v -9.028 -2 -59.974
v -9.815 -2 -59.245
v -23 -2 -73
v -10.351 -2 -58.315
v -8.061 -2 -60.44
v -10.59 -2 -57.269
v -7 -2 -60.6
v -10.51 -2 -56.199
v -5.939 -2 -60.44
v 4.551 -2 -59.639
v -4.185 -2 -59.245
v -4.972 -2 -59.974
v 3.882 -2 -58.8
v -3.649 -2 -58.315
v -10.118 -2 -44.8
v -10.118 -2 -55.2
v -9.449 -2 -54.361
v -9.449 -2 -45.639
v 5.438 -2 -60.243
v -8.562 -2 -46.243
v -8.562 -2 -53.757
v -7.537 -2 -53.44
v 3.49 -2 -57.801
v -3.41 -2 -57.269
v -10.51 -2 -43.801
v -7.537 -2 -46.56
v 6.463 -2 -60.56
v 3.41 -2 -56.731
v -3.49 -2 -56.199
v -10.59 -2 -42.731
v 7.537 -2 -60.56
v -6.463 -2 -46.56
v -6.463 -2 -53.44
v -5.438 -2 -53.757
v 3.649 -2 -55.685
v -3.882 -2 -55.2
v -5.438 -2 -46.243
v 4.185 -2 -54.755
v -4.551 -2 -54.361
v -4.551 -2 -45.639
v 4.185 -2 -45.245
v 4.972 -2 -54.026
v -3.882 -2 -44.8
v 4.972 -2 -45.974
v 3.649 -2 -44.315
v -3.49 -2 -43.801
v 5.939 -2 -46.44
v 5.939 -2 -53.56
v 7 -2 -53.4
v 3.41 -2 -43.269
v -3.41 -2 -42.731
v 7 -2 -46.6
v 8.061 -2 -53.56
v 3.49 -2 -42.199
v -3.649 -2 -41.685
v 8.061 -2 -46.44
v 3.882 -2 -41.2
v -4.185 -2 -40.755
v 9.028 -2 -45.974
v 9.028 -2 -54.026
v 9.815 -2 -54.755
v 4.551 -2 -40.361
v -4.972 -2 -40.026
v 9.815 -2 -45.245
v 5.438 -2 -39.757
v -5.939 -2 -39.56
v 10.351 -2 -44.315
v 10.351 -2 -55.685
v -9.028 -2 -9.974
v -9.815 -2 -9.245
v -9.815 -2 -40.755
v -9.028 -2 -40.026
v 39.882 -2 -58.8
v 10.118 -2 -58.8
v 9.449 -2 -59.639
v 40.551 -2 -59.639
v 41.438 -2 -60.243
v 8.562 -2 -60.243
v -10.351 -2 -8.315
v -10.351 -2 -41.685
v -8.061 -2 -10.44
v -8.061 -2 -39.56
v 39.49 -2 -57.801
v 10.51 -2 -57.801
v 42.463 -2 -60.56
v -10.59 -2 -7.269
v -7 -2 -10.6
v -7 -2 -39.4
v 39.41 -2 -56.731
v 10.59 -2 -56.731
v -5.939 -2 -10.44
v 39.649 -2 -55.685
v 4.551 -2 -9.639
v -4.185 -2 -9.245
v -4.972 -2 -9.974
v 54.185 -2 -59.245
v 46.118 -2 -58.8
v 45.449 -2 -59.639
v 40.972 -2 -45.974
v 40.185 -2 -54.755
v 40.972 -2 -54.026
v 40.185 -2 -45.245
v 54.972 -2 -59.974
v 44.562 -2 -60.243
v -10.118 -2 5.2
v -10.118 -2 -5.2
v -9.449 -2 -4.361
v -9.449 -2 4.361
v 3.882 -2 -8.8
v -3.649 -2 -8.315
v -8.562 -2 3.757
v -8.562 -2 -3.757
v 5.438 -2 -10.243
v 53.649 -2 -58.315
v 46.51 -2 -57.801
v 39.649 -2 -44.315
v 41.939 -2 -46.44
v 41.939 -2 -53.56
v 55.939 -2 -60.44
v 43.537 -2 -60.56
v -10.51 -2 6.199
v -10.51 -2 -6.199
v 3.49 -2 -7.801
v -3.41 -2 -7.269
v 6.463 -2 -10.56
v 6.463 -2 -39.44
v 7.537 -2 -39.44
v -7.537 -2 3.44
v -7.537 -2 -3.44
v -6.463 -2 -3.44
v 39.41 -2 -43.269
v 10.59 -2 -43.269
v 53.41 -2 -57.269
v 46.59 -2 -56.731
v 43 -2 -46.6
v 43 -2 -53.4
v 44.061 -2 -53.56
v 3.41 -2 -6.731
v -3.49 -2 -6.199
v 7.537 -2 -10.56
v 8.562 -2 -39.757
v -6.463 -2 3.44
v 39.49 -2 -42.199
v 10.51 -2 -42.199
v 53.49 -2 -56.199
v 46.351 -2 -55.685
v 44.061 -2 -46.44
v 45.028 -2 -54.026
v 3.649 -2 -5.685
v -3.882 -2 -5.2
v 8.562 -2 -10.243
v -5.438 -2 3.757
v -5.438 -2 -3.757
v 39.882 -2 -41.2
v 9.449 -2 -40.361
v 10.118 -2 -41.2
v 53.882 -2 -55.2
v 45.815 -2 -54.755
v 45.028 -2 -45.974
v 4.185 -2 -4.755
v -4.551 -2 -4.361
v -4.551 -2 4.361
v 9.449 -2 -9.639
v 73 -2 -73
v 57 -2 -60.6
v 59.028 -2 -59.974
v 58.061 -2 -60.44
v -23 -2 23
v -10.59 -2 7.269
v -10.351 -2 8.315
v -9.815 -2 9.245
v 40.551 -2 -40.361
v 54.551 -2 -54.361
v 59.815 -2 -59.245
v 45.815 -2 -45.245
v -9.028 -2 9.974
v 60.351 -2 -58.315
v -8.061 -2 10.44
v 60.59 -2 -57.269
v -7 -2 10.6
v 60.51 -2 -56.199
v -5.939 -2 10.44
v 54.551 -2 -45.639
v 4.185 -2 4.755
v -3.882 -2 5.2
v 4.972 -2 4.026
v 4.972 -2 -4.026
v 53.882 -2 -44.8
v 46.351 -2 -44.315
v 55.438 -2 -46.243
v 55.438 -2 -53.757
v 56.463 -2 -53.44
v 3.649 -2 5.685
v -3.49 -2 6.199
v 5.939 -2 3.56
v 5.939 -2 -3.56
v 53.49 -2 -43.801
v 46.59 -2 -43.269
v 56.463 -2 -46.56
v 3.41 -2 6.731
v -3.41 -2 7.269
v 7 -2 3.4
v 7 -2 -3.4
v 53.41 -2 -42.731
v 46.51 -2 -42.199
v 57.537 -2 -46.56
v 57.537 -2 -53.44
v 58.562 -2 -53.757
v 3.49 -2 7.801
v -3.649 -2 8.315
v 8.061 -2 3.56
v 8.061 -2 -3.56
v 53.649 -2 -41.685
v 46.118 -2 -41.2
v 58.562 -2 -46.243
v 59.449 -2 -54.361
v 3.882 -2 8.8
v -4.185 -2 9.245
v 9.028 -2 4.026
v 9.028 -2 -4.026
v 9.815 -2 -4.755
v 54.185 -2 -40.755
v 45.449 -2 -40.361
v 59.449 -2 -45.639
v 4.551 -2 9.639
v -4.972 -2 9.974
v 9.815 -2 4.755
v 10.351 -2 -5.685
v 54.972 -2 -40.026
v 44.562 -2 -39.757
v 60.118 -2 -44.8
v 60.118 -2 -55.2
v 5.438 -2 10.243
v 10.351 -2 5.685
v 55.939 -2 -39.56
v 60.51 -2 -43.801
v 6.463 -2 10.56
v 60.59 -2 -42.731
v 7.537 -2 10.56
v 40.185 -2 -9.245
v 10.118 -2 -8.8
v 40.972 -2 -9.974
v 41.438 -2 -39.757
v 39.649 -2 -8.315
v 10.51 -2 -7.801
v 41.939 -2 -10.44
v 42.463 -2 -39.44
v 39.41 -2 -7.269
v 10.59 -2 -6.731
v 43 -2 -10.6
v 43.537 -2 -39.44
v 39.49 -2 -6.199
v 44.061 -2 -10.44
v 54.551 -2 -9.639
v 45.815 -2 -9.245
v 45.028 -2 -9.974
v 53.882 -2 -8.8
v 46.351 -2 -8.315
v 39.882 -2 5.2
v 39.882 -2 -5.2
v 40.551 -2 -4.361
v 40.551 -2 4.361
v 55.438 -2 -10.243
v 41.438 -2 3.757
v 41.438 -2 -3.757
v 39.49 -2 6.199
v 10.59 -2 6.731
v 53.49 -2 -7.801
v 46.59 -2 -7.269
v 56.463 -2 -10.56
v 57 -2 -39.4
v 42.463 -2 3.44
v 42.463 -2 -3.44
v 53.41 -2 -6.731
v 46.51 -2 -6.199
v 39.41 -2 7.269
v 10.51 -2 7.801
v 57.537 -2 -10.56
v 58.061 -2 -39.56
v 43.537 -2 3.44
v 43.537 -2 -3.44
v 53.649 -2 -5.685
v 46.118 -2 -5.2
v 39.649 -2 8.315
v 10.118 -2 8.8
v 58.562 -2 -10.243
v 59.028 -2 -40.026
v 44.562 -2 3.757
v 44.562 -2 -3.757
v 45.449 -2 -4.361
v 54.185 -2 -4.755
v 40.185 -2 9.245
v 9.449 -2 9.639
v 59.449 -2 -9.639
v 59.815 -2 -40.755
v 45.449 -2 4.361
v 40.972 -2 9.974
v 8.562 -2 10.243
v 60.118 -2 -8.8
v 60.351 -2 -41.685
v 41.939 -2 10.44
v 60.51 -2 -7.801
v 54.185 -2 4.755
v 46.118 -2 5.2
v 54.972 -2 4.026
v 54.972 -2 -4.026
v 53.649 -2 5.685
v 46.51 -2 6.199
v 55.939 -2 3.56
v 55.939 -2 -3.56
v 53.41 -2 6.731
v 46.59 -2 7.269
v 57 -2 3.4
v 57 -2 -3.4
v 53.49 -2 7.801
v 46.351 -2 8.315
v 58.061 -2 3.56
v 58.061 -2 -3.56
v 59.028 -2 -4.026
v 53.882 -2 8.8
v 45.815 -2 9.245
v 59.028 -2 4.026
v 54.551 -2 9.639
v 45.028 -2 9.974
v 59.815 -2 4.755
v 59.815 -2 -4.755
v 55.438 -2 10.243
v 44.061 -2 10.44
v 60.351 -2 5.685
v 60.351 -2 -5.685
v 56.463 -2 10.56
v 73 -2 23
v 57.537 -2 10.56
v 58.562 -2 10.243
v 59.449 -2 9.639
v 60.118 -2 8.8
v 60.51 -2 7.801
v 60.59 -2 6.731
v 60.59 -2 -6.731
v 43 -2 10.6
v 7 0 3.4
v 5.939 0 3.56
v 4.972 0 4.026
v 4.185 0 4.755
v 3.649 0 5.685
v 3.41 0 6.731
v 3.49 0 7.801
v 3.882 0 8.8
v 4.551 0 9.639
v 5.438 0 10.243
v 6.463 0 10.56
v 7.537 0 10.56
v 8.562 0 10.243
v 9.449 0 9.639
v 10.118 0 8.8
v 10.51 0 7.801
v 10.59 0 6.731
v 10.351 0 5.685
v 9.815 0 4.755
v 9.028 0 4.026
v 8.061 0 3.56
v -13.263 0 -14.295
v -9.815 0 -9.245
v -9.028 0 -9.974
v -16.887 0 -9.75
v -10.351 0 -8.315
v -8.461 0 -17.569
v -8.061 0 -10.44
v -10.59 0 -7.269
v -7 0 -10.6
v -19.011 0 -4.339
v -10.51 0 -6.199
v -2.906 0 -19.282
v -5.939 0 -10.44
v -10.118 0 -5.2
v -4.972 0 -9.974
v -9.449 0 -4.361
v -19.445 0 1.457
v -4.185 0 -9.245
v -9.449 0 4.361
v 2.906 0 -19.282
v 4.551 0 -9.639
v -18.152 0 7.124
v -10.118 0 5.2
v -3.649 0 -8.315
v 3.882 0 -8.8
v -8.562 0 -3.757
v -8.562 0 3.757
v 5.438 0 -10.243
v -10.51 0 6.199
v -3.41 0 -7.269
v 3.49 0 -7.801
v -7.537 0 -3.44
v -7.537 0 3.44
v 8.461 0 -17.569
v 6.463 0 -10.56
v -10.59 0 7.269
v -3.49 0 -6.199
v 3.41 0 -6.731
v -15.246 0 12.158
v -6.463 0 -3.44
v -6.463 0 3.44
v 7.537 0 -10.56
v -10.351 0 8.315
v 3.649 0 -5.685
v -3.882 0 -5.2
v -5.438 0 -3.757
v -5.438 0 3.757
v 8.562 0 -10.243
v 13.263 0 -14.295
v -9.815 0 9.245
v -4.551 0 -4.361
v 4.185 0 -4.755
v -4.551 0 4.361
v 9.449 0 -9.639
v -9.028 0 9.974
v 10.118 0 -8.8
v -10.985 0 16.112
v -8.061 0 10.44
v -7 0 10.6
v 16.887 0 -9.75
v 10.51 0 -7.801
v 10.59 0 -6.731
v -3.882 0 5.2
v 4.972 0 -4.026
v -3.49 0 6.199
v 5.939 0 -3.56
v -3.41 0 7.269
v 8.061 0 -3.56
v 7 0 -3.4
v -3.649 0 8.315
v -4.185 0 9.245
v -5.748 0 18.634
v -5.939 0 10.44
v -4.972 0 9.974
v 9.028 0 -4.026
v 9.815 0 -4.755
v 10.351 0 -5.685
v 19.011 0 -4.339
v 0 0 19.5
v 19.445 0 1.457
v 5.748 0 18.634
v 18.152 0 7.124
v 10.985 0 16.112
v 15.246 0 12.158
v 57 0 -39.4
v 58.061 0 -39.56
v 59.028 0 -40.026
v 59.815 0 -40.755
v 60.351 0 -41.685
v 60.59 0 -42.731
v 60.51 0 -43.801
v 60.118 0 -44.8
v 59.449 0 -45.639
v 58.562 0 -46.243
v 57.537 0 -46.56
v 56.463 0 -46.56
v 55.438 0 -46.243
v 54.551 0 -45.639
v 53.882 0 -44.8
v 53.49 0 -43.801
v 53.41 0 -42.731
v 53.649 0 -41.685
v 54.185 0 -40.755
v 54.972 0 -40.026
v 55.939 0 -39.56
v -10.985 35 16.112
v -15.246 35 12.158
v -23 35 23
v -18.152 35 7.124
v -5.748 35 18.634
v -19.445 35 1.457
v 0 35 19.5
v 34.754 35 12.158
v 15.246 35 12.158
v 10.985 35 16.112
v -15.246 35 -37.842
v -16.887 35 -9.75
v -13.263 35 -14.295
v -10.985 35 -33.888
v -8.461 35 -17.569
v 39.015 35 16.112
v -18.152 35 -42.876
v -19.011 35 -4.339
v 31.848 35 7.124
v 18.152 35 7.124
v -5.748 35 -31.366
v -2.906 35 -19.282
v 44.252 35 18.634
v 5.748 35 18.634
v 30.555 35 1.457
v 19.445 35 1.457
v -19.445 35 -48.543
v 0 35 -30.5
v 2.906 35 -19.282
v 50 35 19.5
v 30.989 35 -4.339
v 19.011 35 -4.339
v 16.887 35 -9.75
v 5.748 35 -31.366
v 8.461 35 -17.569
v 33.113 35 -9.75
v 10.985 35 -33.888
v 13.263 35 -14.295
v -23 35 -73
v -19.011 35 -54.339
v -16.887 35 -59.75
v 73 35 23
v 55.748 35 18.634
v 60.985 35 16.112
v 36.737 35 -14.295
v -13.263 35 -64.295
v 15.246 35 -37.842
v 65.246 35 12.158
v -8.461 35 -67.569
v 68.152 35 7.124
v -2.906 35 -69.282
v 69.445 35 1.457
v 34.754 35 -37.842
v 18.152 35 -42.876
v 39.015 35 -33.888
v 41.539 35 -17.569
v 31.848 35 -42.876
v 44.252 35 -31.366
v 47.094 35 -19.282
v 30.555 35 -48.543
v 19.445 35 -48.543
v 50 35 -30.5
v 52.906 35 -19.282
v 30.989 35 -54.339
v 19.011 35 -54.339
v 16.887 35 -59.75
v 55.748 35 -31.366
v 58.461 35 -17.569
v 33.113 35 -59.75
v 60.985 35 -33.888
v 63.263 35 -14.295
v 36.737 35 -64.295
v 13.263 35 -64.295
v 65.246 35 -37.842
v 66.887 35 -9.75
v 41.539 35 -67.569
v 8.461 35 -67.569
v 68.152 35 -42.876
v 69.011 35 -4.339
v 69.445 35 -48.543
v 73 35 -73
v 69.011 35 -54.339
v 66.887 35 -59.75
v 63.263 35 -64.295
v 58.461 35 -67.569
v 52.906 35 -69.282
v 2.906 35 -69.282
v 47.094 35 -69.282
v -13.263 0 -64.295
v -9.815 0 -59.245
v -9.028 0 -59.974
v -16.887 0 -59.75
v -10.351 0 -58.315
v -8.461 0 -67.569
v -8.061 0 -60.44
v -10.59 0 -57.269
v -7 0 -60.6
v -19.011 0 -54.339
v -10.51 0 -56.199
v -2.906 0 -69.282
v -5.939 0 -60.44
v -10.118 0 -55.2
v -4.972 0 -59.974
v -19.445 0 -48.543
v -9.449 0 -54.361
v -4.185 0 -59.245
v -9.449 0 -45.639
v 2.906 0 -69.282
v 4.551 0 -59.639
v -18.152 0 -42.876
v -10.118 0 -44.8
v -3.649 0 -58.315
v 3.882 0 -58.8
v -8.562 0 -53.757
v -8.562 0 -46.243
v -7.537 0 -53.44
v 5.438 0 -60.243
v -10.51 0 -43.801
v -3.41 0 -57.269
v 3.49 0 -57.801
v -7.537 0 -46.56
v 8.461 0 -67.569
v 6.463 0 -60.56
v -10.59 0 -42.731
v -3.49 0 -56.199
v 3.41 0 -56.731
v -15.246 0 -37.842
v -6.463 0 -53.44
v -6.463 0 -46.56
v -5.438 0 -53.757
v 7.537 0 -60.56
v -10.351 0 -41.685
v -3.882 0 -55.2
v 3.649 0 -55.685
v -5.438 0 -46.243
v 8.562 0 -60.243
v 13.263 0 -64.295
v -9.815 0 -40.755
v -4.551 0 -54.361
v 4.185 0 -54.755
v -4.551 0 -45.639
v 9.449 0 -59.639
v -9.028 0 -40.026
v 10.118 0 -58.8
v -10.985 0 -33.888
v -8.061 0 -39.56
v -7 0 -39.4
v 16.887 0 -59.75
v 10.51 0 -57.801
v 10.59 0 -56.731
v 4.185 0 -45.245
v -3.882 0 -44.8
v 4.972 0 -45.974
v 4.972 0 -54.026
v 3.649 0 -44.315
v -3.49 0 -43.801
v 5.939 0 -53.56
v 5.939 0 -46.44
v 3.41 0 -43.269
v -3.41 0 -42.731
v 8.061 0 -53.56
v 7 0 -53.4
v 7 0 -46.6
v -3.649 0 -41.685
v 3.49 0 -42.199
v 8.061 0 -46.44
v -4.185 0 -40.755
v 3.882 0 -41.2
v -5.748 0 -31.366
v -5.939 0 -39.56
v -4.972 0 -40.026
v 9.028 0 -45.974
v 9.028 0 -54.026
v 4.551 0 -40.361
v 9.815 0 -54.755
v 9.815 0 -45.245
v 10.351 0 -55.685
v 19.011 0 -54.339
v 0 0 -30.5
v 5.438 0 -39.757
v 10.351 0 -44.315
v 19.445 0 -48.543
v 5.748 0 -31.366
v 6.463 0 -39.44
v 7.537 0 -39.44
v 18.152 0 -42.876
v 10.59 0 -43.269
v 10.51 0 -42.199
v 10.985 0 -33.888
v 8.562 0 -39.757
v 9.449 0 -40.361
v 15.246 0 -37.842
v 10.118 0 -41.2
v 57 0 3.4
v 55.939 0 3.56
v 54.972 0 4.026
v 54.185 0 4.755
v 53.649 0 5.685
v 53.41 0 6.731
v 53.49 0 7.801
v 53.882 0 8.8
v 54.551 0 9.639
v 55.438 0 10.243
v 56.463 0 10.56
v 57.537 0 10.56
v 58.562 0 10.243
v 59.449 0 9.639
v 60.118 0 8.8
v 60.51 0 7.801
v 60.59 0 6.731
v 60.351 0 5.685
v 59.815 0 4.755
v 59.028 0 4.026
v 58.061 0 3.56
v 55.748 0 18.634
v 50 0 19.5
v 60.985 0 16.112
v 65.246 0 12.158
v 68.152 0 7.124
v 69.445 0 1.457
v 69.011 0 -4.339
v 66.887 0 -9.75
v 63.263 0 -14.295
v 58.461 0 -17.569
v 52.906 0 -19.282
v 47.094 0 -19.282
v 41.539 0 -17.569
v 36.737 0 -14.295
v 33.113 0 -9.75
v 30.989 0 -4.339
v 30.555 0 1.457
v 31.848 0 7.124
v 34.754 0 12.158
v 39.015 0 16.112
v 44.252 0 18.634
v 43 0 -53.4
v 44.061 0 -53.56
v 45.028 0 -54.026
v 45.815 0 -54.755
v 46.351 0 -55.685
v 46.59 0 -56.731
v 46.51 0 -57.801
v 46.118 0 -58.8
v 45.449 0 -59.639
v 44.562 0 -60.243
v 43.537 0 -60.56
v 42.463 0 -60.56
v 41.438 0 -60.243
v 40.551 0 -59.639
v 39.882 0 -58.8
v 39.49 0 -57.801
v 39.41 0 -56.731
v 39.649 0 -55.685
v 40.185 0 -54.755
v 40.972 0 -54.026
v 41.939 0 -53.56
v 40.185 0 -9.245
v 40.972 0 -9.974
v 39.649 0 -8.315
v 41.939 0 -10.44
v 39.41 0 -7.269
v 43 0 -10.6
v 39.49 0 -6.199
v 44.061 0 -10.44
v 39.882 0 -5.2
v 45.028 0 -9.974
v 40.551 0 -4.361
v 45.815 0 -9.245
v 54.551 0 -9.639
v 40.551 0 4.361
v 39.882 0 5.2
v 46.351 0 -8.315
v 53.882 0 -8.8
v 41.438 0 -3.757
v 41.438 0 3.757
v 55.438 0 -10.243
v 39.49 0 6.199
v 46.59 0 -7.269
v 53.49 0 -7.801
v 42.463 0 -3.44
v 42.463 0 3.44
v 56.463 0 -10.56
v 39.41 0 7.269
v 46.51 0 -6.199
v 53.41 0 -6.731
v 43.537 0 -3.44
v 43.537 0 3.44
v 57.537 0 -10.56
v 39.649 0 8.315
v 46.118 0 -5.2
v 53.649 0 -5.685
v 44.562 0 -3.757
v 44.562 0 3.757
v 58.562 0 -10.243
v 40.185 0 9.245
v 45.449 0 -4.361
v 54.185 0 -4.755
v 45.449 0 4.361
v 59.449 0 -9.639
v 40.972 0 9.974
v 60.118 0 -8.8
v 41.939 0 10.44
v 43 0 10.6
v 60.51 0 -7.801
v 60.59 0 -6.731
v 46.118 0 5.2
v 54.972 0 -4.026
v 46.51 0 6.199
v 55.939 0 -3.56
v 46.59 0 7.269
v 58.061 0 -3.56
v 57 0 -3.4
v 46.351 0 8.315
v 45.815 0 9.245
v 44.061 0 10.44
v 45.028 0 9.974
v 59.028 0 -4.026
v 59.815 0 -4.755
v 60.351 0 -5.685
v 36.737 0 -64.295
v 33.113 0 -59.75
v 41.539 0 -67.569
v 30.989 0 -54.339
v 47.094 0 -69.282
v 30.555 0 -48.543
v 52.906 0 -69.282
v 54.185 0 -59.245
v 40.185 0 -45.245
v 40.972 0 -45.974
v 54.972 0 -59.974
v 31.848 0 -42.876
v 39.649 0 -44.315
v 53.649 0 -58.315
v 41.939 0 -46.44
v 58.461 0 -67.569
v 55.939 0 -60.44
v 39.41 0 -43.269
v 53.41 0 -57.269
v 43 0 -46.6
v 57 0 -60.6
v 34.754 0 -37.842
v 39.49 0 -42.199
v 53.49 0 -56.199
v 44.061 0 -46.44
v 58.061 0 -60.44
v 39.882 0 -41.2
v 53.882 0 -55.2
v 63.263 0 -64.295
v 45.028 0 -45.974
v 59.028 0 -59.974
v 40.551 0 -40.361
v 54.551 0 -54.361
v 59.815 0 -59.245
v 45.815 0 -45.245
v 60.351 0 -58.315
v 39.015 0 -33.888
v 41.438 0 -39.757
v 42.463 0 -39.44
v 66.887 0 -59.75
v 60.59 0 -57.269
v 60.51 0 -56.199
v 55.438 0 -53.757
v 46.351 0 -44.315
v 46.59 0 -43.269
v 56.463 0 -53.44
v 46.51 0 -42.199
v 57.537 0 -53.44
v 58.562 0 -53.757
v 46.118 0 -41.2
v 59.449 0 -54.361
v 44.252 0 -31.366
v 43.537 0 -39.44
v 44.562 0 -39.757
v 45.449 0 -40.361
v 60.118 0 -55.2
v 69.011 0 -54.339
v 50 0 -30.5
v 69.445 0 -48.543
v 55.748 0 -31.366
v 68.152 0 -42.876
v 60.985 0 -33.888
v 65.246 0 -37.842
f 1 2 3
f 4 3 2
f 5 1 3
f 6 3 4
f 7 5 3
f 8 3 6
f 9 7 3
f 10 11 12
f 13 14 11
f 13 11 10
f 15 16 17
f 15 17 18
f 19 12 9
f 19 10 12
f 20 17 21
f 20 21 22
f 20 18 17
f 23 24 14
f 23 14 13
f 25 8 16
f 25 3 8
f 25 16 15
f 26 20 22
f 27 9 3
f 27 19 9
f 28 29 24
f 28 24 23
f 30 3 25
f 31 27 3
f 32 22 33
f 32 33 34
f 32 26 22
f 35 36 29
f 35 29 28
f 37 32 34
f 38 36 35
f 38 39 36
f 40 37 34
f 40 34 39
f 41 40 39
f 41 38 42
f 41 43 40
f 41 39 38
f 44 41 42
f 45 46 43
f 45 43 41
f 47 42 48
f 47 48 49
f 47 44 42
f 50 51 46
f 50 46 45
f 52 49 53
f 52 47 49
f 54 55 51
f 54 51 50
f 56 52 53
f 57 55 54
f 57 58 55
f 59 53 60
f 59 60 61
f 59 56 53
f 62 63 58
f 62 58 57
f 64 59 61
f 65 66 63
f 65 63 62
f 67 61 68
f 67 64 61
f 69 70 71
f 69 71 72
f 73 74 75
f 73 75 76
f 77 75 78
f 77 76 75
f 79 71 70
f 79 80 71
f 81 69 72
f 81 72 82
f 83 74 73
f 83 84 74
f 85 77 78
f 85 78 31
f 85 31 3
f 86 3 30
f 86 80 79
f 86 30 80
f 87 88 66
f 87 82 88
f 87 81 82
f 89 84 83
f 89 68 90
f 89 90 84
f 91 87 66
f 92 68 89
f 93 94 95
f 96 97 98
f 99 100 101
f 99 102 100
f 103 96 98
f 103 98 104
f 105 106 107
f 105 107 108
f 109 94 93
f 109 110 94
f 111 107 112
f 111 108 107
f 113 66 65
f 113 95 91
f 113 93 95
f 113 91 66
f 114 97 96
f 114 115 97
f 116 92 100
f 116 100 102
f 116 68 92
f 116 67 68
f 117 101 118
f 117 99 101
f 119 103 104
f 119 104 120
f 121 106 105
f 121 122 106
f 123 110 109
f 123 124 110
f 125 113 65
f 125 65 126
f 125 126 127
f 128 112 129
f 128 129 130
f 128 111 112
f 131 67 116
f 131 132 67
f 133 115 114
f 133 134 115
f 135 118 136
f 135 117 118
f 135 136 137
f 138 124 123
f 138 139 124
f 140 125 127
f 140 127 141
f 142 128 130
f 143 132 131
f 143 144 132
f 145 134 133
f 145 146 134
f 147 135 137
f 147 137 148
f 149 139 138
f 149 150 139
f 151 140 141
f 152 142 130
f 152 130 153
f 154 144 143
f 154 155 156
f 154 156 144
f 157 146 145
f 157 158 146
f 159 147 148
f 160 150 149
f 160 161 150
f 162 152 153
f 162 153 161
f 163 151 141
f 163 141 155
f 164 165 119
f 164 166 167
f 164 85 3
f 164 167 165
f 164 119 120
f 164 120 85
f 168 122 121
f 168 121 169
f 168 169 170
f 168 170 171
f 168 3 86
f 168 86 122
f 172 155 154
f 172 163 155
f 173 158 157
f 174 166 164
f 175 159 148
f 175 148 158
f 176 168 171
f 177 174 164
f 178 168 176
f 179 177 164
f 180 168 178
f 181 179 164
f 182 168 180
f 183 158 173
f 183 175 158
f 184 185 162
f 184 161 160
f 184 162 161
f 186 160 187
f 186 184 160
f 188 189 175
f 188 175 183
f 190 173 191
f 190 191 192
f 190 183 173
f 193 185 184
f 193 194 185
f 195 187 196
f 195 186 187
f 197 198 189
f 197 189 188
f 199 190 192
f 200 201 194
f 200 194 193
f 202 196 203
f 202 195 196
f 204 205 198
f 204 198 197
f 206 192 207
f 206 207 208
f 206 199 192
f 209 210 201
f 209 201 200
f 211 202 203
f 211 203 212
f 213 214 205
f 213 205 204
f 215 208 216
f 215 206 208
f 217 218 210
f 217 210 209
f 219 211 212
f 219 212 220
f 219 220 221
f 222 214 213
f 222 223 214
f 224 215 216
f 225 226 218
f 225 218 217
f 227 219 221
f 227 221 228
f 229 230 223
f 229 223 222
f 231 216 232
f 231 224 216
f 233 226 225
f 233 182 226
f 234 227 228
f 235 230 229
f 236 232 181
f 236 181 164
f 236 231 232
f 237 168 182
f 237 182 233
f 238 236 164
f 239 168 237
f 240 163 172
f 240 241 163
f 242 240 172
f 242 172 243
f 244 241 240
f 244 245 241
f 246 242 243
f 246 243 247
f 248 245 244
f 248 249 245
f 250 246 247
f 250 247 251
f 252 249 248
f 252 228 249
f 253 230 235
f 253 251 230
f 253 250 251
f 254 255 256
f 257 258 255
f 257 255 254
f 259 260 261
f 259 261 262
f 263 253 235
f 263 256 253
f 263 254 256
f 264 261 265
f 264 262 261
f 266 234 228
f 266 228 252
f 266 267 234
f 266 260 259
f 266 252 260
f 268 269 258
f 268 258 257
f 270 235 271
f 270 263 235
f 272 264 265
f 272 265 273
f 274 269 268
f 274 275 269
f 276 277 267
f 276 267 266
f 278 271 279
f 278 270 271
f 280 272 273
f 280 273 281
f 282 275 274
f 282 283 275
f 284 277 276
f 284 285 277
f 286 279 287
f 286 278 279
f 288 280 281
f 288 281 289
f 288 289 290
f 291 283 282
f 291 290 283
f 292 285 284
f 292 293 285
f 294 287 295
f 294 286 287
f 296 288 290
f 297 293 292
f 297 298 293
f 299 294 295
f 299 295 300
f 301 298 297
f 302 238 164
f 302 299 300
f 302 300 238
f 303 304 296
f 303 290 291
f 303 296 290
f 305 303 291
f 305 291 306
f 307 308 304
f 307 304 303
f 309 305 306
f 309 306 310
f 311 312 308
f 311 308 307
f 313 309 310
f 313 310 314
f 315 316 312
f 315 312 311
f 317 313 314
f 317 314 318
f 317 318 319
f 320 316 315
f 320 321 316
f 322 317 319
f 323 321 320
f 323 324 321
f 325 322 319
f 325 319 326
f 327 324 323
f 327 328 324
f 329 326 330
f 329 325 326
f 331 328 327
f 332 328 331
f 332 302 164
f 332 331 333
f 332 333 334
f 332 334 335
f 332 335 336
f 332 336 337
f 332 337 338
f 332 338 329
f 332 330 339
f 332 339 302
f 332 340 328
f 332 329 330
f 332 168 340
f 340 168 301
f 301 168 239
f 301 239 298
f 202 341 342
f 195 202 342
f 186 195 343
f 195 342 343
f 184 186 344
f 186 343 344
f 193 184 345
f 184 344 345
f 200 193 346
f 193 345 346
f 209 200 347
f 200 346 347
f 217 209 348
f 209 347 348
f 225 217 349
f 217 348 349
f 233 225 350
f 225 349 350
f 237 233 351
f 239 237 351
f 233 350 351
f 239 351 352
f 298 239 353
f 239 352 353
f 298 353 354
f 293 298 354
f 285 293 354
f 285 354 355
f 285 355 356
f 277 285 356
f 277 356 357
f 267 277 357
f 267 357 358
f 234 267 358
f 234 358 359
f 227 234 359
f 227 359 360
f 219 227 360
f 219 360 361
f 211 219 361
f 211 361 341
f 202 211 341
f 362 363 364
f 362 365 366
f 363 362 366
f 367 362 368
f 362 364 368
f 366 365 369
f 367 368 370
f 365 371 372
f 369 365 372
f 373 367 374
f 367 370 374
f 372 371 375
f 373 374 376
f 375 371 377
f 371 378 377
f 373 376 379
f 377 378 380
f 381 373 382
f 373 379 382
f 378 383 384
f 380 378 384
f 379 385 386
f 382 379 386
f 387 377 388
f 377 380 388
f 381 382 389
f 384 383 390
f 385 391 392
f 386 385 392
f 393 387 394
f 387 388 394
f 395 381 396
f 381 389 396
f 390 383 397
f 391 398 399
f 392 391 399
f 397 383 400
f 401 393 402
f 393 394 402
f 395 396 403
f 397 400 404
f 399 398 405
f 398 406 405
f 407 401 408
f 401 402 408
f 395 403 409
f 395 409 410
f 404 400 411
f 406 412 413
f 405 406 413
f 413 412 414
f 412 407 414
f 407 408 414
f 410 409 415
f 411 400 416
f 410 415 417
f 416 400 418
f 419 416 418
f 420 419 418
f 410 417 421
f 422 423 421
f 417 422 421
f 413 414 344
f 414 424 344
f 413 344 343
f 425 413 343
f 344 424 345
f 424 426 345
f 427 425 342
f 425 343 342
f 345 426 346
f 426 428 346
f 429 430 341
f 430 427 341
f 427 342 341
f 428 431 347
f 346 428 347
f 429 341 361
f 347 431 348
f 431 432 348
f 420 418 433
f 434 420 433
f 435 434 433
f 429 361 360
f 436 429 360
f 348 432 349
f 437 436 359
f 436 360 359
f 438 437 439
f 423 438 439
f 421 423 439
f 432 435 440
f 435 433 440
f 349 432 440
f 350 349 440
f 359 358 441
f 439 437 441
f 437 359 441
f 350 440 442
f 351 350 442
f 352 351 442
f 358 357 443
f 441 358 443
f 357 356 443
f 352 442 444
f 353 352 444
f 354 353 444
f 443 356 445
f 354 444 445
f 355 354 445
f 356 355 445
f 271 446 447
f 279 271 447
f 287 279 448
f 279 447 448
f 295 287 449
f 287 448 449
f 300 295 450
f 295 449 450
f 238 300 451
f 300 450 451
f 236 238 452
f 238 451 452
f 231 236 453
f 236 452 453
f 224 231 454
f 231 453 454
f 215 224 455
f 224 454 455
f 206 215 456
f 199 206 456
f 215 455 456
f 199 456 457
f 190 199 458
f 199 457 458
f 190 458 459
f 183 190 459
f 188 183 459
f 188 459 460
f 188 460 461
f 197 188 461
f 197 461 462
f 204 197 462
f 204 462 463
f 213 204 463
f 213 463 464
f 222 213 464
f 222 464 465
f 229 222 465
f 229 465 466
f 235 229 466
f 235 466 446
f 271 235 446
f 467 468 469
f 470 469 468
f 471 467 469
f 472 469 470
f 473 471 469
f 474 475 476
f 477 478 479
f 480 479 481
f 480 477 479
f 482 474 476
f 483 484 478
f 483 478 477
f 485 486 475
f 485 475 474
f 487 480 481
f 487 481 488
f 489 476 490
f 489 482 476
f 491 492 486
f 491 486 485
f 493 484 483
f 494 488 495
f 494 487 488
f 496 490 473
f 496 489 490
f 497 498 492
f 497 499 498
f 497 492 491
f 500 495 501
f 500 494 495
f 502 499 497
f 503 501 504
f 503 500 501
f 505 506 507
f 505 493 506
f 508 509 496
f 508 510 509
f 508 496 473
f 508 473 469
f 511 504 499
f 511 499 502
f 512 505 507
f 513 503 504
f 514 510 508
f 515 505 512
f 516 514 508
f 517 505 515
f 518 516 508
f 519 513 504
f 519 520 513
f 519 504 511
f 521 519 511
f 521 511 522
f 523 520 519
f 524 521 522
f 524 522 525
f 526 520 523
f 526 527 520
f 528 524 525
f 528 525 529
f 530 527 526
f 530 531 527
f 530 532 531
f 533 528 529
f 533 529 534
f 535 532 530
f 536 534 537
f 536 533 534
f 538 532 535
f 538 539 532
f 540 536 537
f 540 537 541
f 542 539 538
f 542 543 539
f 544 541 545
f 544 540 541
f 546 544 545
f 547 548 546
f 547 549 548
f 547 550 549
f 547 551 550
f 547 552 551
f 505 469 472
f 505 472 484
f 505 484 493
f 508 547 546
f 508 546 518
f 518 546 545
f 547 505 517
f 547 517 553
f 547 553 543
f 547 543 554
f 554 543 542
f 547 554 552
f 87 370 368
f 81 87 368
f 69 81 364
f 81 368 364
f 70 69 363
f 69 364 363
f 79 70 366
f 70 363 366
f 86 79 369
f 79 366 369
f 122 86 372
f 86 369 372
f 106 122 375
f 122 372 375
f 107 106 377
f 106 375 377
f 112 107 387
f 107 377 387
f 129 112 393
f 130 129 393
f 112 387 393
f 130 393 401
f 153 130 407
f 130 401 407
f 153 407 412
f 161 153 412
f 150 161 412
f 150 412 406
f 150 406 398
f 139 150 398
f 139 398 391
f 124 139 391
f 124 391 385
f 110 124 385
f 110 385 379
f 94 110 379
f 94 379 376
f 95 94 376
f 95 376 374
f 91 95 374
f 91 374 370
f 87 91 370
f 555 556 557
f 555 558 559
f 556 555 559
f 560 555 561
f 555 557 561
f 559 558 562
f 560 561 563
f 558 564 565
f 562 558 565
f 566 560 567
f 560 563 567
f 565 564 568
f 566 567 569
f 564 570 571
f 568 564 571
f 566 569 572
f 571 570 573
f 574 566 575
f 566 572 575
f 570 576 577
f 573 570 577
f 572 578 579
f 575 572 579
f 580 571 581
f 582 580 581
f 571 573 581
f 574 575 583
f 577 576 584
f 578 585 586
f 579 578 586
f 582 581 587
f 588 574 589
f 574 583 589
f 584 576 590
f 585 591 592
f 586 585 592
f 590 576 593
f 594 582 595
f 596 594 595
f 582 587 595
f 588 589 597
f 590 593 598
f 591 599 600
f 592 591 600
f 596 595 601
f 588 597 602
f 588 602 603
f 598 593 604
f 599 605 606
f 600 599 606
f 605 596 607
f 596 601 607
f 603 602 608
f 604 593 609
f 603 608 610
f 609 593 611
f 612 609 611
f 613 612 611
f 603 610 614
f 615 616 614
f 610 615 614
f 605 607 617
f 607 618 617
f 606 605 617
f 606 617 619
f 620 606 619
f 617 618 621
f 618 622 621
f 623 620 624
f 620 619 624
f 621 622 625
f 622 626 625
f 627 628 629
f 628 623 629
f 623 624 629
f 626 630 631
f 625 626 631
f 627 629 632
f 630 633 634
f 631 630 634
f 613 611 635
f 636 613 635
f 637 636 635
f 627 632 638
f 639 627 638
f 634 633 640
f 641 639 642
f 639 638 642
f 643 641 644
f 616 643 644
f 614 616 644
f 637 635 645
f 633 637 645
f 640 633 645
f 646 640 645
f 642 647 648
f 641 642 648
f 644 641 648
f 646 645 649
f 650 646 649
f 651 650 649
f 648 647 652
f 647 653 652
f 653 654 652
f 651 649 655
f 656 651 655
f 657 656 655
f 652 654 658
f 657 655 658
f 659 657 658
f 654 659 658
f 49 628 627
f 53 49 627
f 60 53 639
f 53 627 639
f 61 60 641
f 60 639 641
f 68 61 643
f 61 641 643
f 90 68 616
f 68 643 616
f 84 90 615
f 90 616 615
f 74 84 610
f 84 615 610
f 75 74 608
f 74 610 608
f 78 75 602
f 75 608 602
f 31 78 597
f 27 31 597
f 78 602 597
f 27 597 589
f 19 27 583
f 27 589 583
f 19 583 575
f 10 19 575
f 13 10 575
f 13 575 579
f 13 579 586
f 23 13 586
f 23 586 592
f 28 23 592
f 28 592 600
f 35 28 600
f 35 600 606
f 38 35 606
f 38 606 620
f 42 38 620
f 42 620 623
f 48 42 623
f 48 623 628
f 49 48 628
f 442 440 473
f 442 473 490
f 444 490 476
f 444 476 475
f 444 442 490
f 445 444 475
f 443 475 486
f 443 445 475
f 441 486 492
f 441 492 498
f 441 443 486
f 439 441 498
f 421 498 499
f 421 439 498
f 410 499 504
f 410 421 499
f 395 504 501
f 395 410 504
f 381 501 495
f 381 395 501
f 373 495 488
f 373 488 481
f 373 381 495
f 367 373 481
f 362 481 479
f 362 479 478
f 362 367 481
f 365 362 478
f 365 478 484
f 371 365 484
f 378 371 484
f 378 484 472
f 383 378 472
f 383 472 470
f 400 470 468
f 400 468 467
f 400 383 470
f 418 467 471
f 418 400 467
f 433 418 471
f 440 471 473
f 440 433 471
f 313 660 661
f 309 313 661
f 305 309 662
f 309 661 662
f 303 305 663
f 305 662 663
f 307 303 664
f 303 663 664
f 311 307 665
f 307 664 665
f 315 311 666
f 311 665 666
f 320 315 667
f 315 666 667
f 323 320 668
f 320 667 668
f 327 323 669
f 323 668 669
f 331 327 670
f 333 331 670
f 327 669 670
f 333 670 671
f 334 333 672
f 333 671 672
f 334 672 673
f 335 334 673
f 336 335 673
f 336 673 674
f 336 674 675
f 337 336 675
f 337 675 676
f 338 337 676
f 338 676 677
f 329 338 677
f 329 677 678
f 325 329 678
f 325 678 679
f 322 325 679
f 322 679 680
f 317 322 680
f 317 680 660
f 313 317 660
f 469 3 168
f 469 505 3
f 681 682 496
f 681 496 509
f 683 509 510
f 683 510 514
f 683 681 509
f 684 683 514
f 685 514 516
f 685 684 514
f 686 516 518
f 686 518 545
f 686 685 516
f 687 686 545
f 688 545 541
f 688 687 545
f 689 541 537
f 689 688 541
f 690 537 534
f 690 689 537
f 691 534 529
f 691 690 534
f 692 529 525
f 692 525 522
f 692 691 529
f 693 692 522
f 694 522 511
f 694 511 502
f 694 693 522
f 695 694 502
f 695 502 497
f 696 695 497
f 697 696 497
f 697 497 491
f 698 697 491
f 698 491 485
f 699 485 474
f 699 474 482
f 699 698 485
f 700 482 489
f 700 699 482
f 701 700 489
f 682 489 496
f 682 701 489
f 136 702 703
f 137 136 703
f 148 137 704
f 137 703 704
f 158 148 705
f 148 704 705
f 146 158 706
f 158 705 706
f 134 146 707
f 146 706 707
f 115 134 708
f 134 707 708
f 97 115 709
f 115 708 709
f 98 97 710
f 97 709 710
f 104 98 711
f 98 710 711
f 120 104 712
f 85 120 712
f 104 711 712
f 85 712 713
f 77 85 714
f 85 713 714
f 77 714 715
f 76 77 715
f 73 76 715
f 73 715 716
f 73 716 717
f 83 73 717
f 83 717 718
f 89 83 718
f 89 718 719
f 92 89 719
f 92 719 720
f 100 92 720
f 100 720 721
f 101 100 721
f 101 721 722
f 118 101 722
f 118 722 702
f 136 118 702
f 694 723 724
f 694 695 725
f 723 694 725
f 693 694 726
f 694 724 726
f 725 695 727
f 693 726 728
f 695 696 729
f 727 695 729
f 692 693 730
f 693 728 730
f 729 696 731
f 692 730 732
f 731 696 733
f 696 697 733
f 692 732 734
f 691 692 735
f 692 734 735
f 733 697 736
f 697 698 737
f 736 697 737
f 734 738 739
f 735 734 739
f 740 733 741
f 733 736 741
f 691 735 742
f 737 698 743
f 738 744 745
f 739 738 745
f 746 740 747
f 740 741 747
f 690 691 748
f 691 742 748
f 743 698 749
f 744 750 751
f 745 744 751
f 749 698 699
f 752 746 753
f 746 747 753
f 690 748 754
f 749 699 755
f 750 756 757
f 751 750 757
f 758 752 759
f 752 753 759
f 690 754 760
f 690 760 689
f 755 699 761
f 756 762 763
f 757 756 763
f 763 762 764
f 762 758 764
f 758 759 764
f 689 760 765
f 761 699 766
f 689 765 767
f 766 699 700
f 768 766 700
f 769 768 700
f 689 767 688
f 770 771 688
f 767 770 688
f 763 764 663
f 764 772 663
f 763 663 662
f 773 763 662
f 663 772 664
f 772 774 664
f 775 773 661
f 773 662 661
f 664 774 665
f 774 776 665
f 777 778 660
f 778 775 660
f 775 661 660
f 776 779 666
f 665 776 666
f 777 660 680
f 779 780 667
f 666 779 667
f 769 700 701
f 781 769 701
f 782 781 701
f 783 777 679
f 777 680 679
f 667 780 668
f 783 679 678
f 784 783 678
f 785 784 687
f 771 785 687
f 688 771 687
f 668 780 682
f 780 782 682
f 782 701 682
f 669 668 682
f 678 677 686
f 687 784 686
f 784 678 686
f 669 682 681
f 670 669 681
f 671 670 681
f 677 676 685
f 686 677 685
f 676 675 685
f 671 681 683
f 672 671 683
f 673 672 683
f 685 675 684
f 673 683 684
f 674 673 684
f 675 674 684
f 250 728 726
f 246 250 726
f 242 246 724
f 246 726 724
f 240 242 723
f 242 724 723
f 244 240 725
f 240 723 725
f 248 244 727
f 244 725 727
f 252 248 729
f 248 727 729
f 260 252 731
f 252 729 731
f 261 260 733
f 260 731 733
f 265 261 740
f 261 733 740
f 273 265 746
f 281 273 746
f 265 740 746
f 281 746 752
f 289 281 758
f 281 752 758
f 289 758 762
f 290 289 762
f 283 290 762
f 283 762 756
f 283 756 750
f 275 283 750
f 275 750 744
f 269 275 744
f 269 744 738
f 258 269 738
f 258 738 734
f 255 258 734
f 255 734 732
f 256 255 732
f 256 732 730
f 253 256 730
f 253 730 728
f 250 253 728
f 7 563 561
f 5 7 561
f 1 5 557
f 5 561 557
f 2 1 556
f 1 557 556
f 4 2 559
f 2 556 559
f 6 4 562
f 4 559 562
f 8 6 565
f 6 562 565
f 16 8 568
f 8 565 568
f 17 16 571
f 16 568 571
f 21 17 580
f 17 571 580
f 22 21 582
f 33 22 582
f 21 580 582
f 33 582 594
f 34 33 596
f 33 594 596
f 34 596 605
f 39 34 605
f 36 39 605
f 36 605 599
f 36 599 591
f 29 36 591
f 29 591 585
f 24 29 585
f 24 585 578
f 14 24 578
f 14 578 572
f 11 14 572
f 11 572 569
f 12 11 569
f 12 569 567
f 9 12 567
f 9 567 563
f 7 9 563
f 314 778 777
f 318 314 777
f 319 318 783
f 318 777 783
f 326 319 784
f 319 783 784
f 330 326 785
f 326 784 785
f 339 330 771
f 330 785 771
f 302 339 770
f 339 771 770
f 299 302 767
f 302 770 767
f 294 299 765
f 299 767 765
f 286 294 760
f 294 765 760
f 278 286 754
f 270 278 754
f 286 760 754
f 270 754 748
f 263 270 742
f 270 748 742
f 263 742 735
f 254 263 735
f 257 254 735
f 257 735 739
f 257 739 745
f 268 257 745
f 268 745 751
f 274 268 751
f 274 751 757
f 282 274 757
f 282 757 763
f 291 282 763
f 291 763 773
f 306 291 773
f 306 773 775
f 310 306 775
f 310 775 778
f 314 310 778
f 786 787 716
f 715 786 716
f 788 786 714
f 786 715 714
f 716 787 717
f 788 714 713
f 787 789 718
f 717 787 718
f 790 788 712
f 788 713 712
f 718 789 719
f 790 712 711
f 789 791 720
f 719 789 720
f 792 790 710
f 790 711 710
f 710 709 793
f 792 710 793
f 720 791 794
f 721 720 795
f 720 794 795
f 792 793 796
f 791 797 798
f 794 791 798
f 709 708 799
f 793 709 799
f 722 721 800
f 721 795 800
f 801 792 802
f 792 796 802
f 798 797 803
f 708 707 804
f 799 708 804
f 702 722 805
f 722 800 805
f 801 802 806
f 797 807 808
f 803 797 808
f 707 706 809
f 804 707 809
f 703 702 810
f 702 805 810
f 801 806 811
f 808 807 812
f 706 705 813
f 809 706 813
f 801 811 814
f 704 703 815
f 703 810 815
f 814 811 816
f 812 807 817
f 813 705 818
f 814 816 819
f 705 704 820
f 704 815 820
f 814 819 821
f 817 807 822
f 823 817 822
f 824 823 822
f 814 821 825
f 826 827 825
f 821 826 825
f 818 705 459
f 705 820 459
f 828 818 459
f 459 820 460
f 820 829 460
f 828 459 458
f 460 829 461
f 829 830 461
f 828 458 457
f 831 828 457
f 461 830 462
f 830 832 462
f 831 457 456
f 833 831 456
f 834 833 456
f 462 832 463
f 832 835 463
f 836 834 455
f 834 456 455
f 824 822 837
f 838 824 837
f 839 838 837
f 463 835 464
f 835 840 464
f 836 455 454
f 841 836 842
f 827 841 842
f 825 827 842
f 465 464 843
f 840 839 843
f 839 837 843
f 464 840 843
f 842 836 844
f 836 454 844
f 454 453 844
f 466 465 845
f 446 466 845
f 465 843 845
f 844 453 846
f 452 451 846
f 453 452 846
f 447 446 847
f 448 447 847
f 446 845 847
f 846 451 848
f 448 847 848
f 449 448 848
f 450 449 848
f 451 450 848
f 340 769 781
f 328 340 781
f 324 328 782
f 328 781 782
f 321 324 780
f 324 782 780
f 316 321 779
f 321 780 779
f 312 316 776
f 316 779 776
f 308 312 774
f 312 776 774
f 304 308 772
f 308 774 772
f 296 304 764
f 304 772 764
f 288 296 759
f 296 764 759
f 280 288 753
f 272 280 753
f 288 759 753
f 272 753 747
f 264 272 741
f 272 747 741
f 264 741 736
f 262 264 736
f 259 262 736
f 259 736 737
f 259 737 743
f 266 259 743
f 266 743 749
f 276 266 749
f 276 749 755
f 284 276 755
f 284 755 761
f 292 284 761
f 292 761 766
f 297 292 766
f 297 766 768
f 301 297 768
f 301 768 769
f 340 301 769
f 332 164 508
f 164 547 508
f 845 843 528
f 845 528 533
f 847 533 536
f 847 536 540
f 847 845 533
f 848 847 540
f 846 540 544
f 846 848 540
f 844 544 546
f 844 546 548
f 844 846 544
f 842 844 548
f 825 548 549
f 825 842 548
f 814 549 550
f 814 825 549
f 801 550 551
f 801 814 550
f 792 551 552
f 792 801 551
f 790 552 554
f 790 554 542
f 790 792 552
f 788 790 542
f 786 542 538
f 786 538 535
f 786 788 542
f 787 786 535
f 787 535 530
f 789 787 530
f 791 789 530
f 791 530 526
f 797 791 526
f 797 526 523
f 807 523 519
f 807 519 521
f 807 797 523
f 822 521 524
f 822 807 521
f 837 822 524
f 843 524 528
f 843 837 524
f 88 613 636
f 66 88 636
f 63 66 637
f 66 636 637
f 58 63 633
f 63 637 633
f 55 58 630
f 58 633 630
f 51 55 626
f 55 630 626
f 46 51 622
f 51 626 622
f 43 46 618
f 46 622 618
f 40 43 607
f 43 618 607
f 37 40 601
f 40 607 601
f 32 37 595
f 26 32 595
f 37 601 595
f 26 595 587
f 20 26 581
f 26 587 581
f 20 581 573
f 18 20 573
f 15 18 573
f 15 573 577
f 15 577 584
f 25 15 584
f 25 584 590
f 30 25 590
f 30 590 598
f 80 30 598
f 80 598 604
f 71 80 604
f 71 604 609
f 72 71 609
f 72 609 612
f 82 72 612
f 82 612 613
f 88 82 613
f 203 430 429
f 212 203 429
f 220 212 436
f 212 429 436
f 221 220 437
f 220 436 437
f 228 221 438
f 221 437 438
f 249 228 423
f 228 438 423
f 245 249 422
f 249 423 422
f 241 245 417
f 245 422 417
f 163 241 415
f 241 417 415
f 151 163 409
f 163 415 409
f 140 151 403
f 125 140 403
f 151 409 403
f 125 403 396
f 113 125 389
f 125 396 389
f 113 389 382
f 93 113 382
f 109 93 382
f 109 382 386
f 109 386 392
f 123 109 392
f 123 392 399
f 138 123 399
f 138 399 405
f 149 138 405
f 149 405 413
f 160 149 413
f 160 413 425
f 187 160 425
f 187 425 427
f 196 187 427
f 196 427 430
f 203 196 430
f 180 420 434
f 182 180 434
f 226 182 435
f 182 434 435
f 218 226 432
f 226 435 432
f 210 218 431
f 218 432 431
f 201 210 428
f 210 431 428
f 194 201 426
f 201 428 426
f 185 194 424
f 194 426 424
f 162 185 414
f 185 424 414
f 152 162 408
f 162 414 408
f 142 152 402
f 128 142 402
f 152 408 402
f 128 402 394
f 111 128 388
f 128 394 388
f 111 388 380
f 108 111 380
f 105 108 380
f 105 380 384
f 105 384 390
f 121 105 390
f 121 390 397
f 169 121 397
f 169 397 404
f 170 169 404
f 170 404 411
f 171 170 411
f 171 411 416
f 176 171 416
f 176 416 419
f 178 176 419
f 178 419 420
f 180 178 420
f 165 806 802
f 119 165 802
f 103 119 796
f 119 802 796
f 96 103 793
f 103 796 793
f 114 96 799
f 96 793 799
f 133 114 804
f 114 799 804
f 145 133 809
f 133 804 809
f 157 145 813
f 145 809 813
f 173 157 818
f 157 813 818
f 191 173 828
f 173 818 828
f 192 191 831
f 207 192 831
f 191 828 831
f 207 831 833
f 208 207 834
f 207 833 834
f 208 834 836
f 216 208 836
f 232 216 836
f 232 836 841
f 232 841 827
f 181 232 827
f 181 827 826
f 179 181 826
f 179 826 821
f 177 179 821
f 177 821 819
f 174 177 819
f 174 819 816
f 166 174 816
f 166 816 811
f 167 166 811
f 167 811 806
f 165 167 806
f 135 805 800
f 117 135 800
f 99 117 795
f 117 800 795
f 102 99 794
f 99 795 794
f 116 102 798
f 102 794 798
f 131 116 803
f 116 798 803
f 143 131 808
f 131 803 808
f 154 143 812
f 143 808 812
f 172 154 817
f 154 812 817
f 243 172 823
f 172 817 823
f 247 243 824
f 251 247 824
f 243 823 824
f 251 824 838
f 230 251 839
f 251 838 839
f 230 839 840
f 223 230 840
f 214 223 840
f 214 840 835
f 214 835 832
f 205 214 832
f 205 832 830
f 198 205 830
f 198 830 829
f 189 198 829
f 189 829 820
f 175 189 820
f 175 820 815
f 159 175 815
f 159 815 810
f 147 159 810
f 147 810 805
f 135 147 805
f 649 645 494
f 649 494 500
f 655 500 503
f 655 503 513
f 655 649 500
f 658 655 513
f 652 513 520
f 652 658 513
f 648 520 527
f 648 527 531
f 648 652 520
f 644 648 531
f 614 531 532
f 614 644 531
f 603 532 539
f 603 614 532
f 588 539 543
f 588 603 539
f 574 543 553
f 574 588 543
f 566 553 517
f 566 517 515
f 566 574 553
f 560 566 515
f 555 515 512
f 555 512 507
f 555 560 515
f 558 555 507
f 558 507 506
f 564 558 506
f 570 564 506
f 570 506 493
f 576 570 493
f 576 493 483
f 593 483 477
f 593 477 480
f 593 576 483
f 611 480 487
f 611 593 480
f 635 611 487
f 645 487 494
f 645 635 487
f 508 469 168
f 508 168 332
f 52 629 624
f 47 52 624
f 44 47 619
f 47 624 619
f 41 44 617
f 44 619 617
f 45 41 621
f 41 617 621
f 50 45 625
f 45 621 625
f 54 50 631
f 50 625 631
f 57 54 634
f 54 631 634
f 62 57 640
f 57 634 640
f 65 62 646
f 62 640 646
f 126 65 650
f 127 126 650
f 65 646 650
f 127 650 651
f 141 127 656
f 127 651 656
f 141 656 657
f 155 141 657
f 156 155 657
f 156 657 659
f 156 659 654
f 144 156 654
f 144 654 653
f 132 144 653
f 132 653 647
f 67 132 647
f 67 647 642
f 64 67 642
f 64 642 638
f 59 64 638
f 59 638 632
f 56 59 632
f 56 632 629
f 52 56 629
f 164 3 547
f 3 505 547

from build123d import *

# Parameters (mm, degrees)
SKETCH1_W           = 96
SKETCH1_H           = 96
SKETCH1_R           = 19.5
BOSS_EXTRUDE1_DEPTH = 35
SKETCH2_W           = 96
SKETCH2_H           = 96
BOSS_EXTRUDE2_DEPTH = 2
SKETCH3_R           = 3.6
CUT_EXTRUDE1_DEPTH  = 110.009173926


with BuildPart() as part:
    # Sketch1 → Boss-Extrude1 (new body)
    with BuildSketch(Plane(origin=(0, 0, 0), x_dir=(1, 0, 0), z_dir=(0, 1, 0))):
        with Locations((25, 25)):
            Rectangle(SKETCH1_W, SKETCH1_H)
        with Locations(Location((0, 0, 0), (0, 0, 270))):
            Circle(SKETCH1_R, mode=Mode.SUBTRACT)
        with Locations(Location((50, 0, 0), (0, 0, 270))):
            Circle(SKETCH1_R, mode=Mode.SUBTRACT)
        with Locations(Location((50, 50, 0), (0, 0, 270))):
            Circle(SKETCH1_R, mode=Mode.SUBTRACT)
        with Locations(Location((0, 50, 0), (0, 0, 270))):
            Circle(SKETCH1_R, mode=Mode.SUBTRACT)
    extrude(amount=BOSS_EXTRUDE1_DEPTH)

    # Sketch2 → Boss-Extrude2 (add)
    with BuildSketch(Plane.XZ):
        with Locations((25, -25)):
            Rectangle(SKETCH2_W, SKETCH2_H)
    extrude(amount=BOSS_EXTRUDE2_DEPTH)

    # Sketch3 → Cut-Extrude1 (cut, through all)
    with BuildSketch(Plane(origin=(0, 0, 0), x_dir=(1, 0, 0), z_dir=(0, 1, 0))):
        with Locations(Location((57, 43, 0), (0, 0, 270))):
            Circle(SKETCH3_R)
        with Locations(Location((57, 57, 0), (0, 0, 90))):
            Circle(SKETCH3_R)
        with Locations(Location((43, 43, 0), (0, 0, 90))):
            Circle(SKETCH3_R)
        with Locations(Location((43, 57, 0), (0, 0, 270))):
            Circle(SKETCH3_R)
        with Locations(Location((57, 7, 0), (0, 0, 270))):
            Circle(SKETCH3_R)
        with Locations(Location((43, 7, 0), (0, 0, 90))):
            Circle(SKETCH3_R)
        with Locations(Location((43, -7, 0), (0, 0, 270))):
            Circle(SKETCH3_R)
        with Locations(Location((57, -7, 0), (0, 0, 90))):
            Circle(SKETCH3_R)
        with Locations(Location((7, 7, 0), (0, 0, 270))):
            Circle(SKETCH3_R)
        with Locations(Location((7, -7, 0), (0, 0, 90))):
            Circle(SKETCH3_R)
        with Locations(Location((-7, -7, 0), (0, 0, 270))):
            Circle(SKETCH3_R)
        with Locations(Location((-7, 7, 0), (0, 0, 90))):
            Circle(SKETCH3_R)
        with Locations(Location((7, 57, 0), (0, 0, 270))):
            Circle(SKETCH3_R)
        with Locations(Location((7, 43, 0), (0, 0, 90))):
            Circle(SKETCH3_R)
        with Locations(Location((-7, 43, 0), (0, 0, 270))):
            Circle(SKETCH3_R)
        with Locations(Location((-7, 57, 0), (0, 0, 90))):
            Circle(SKETCH3_R)
    extrude(amount=-CUT_EXTRUDE1_DEPTH, mode=Mode.SUBTRACT)


solid = part.part
